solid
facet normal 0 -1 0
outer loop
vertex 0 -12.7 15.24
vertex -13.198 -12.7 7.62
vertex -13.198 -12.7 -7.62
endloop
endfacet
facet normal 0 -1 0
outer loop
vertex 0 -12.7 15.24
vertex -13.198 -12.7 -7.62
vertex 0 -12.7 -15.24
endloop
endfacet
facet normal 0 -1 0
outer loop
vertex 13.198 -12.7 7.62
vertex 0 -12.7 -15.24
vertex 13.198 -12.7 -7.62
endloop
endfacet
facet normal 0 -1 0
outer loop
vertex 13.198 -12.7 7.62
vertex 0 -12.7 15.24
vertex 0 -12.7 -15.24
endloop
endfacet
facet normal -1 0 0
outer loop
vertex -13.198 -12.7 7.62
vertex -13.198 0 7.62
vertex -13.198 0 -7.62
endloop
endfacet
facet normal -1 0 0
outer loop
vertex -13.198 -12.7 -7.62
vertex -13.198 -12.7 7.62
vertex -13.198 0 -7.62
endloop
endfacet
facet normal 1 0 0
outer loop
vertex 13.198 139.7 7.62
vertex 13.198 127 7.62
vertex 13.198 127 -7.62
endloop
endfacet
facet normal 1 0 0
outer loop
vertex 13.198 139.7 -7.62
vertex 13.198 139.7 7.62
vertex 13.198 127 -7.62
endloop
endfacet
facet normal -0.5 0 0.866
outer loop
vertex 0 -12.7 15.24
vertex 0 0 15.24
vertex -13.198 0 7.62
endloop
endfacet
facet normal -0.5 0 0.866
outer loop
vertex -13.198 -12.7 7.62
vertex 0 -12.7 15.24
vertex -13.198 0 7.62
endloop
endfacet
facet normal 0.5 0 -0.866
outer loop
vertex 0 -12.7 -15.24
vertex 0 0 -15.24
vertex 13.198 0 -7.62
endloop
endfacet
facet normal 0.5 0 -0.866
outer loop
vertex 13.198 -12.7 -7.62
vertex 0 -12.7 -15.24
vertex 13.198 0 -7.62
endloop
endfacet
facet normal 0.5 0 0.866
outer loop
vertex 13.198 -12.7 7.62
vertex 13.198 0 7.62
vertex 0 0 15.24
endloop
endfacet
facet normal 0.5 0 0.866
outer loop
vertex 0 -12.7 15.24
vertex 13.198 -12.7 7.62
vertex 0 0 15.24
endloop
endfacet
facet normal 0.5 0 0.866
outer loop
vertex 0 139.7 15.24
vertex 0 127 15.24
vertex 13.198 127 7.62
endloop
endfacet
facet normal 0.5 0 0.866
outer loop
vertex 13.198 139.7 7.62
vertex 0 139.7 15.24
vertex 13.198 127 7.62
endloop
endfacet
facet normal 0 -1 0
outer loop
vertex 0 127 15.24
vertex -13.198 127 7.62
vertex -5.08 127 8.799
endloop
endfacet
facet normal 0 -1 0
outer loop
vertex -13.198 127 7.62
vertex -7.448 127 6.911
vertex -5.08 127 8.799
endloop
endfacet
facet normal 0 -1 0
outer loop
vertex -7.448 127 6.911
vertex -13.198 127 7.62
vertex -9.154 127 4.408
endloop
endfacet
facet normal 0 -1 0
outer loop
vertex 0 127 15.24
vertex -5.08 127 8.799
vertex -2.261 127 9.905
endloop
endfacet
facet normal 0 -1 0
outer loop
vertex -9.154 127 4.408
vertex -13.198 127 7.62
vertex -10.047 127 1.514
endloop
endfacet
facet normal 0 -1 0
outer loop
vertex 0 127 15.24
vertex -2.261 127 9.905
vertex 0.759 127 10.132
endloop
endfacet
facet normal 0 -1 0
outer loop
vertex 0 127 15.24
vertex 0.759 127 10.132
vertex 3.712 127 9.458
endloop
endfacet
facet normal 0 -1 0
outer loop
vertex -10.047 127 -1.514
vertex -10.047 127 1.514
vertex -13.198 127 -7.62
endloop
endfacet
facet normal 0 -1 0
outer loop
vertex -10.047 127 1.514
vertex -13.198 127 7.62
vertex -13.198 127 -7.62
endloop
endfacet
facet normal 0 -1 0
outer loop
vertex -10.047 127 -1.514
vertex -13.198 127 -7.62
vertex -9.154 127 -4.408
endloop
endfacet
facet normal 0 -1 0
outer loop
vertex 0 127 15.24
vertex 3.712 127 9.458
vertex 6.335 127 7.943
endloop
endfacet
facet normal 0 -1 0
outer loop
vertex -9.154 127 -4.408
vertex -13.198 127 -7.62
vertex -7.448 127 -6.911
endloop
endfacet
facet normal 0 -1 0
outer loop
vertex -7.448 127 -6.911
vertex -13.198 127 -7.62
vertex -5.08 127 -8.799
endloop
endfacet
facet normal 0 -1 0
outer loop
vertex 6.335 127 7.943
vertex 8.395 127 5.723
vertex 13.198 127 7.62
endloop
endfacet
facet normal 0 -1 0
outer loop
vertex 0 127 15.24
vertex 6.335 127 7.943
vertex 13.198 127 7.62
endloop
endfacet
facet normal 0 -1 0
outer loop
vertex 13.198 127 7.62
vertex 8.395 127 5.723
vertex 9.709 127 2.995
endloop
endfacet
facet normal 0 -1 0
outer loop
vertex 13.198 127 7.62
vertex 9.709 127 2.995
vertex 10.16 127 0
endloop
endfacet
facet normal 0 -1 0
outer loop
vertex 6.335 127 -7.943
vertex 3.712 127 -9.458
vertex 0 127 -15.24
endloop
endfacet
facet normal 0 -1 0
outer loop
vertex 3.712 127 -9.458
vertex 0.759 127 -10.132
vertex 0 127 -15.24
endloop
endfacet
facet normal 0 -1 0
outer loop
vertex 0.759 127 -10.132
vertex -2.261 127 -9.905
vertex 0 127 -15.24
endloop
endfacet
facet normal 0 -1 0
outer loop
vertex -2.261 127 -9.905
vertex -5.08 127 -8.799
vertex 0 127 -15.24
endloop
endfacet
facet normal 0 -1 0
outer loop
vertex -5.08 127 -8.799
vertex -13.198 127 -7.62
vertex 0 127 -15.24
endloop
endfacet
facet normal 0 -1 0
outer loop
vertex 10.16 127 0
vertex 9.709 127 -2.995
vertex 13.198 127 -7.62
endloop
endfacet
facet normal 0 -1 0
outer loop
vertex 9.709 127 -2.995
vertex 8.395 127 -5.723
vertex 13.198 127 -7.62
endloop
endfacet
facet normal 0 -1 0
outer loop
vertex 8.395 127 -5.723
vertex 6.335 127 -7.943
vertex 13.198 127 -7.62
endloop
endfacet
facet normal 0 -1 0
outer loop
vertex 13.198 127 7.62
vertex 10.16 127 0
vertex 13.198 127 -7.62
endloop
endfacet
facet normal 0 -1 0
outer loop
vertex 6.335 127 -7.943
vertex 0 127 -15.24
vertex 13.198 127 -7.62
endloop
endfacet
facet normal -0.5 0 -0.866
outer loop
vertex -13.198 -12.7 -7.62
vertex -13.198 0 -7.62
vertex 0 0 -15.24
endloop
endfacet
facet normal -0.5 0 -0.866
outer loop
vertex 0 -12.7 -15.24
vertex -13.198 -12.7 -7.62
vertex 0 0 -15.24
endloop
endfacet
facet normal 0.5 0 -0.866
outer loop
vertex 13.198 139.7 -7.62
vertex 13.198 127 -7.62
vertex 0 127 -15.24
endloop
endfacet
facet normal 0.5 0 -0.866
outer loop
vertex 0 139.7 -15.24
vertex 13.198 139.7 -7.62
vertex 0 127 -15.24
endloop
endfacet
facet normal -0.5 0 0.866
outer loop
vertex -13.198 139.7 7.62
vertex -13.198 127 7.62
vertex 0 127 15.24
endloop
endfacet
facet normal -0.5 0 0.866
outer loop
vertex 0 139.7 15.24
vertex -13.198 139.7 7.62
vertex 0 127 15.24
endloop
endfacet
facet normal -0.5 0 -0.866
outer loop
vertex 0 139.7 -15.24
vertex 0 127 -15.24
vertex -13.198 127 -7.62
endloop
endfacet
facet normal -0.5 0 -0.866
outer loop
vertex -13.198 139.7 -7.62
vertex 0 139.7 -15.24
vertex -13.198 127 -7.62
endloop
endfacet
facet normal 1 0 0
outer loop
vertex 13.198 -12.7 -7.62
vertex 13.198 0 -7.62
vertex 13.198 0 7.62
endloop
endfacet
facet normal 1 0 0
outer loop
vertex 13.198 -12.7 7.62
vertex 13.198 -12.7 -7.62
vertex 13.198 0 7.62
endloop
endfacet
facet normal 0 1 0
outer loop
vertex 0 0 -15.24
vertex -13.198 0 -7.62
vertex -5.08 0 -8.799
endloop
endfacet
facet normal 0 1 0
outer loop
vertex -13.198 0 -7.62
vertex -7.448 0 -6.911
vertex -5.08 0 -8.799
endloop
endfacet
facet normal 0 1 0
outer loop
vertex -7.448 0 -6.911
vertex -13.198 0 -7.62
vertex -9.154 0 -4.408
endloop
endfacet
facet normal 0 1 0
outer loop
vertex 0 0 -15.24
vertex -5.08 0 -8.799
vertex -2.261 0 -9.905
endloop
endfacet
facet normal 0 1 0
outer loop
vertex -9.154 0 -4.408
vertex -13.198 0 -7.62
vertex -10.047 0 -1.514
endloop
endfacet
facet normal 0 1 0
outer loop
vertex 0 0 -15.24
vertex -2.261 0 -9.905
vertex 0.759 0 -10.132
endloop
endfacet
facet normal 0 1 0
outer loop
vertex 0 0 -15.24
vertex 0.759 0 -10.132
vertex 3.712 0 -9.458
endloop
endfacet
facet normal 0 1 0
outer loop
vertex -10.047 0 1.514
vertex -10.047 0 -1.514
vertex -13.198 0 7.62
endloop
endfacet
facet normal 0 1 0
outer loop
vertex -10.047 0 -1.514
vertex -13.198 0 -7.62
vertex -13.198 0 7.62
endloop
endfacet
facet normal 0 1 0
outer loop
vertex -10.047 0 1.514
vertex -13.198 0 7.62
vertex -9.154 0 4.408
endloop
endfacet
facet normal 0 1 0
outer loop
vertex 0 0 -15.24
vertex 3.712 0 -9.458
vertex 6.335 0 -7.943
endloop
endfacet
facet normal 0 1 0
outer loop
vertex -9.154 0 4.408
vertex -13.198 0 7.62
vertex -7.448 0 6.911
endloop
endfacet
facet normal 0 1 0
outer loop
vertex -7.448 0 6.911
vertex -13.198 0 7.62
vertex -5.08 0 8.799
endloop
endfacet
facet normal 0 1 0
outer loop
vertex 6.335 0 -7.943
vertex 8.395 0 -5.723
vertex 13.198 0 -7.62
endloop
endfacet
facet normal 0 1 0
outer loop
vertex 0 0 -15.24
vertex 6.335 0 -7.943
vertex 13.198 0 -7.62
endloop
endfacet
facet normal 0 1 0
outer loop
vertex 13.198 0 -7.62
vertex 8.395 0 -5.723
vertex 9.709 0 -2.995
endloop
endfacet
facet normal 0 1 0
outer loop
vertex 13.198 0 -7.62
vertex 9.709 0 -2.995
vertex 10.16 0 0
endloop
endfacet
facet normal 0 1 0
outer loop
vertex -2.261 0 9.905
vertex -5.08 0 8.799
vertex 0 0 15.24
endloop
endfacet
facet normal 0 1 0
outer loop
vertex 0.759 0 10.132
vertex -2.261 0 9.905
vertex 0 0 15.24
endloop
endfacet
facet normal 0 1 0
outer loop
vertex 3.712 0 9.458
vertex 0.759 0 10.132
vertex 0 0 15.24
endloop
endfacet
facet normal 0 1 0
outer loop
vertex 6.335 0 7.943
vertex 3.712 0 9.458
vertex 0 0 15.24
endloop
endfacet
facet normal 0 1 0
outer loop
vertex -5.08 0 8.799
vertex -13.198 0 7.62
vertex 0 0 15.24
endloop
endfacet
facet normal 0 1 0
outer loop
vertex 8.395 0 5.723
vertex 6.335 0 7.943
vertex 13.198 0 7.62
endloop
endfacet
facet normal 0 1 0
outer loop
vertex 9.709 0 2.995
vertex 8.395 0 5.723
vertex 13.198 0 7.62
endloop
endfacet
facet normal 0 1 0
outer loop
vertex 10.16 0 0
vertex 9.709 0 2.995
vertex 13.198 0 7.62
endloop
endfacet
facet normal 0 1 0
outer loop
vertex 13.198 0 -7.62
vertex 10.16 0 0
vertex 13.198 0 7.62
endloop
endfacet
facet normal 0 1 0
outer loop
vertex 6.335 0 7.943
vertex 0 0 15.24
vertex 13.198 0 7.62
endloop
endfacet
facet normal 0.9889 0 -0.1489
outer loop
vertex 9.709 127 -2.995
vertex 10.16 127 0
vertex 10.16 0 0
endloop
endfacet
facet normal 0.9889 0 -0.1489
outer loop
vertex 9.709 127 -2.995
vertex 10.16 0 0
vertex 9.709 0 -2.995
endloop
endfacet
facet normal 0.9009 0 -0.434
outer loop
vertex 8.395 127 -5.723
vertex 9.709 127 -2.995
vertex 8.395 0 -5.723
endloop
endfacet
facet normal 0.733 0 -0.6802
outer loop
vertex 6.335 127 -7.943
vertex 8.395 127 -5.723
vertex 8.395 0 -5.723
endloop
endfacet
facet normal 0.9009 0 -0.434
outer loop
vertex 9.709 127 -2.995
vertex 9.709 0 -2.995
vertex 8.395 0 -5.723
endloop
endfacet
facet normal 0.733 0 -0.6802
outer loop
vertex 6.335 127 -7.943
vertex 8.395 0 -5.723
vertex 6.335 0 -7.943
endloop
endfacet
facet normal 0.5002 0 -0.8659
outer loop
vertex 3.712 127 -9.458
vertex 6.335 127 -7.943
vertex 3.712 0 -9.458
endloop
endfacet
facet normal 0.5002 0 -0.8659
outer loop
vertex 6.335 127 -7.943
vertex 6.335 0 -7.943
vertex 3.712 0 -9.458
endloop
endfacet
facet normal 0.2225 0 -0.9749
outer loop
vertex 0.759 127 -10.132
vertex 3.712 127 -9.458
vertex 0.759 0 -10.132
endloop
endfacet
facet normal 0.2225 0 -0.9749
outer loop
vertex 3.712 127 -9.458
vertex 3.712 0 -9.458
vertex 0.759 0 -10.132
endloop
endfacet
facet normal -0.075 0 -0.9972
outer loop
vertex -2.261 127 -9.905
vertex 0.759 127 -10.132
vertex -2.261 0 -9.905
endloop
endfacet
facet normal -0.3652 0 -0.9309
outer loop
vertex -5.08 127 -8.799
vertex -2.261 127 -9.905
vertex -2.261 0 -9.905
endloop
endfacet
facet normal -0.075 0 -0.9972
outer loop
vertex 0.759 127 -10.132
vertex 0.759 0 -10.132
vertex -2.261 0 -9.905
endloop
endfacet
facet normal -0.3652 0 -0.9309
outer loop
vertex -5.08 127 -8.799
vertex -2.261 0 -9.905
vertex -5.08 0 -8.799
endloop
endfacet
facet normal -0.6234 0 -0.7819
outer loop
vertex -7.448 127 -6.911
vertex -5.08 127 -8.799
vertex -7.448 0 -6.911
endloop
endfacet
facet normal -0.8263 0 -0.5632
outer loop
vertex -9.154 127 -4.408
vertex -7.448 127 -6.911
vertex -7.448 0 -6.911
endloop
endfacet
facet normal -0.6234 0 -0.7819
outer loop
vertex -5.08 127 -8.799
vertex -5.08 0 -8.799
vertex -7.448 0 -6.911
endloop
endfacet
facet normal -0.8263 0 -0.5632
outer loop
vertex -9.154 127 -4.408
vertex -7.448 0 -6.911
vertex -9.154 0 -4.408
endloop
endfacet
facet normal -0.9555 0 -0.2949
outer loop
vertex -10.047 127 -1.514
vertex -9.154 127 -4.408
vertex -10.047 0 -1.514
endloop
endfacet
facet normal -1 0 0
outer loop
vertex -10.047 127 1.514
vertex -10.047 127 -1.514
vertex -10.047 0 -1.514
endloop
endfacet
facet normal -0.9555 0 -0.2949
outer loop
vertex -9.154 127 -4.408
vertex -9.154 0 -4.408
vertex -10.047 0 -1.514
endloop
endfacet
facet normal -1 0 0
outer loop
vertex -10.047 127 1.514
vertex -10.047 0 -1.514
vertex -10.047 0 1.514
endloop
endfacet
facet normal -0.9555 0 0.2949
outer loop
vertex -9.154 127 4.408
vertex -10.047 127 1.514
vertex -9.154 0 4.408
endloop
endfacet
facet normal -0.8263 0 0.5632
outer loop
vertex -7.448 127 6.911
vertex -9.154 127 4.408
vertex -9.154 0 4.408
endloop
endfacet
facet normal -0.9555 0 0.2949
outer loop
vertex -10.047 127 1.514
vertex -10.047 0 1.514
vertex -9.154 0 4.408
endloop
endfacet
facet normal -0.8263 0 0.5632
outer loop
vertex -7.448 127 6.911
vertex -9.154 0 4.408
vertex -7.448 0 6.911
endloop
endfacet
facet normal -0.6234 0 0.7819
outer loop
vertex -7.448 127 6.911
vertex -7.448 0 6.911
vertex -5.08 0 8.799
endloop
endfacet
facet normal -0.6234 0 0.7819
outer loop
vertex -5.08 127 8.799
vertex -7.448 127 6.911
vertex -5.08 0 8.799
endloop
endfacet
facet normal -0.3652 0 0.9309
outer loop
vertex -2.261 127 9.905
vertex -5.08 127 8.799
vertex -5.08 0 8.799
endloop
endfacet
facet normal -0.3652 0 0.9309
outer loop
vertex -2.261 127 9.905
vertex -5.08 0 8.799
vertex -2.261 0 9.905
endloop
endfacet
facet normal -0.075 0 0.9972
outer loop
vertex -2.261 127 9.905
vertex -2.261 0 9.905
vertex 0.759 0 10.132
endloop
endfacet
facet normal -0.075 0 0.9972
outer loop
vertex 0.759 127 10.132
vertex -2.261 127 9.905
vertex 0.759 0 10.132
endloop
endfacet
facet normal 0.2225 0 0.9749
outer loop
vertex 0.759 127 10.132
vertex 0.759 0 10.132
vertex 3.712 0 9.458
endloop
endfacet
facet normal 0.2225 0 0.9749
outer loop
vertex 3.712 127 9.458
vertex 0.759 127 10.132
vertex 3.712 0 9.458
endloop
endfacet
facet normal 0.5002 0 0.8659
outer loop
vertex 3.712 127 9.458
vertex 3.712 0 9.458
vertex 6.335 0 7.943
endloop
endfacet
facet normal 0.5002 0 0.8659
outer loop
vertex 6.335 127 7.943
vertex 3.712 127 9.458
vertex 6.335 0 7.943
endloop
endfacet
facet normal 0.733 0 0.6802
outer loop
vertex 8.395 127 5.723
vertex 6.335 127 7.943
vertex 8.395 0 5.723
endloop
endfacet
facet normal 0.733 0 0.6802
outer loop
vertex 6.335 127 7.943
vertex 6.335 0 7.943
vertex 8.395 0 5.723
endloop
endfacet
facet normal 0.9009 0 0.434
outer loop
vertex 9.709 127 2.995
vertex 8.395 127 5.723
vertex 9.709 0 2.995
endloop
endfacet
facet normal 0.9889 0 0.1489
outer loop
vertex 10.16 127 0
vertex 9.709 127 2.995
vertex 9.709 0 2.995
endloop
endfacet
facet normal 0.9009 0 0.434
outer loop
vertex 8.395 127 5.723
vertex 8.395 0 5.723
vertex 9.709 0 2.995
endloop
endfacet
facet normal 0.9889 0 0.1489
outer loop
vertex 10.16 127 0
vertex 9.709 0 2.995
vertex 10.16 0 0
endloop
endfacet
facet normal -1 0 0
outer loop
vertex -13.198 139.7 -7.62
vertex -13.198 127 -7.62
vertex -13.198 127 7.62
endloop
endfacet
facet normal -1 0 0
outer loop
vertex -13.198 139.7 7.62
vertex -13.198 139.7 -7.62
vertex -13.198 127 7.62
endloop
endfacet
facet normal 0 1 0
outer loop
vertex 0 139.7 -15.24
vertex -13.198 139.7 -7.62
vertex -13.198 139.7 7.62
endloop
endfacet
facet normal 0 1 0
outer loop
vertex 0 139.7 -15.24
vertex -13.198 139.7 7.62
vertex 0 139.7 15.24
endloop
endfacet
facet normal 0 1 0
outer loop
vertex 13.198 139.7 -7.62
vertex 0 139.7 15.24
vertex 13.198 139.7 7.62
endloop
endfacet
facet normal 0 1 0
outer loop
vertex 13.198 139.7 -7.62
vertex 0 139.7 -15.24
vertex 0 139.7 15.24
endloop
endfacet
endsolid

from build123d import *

# Parameters (mm, degrees)
SKETCH1_R           = 10.16
BOSS_EXTRUDE1_DEPTH = 127
BOSS_EXTRUDE2_DEPTH = 12.7
BOSS_EXTRUDE3_DEPTH = 12.7


with BuildPart() as part:
    # Sketch1 → Boss-Extrude1 (new body)
    with BuildSketch(Plane(origin=(0, 0, 0), x_dir=(1, 0, 0), z_dir=(0, 1, 0))):
        Circle(SKETCH1_R)
    extrude(amount=BOSS_EXTRUDE1_DEPTH)

    # Sketch2 → Boss-Extrude2 (add)
    with BuildSketch(Plane(origin=(0, 127, 0), x_dir=(1, 0, 0), z_dir=(0, 1, 0))):
        Polygon((0, 15.24), (-13.198227154, 7.62), (-13.198227154, -7.62), (0, -15.24), (13.198227154, -7.62), (13.198227154, 7.62), align=None)
    extrude(amount=BOSS_EXTRUDE2_DEPTH)

    # Sketch3 → Boss-Extrude3 (add)
    with BuildSketch(Plane.XZ):
        Polygon((-13.198227154, 7.62), (-13.198227154, -7.62), (0, -15.24), (13.198227154, -7.62), (13.198227154, 7.62), (0, 15.24), align=None)
    extrude(amount=BOSS_EXTRUDE3_DEPTH)


solid = part.part
